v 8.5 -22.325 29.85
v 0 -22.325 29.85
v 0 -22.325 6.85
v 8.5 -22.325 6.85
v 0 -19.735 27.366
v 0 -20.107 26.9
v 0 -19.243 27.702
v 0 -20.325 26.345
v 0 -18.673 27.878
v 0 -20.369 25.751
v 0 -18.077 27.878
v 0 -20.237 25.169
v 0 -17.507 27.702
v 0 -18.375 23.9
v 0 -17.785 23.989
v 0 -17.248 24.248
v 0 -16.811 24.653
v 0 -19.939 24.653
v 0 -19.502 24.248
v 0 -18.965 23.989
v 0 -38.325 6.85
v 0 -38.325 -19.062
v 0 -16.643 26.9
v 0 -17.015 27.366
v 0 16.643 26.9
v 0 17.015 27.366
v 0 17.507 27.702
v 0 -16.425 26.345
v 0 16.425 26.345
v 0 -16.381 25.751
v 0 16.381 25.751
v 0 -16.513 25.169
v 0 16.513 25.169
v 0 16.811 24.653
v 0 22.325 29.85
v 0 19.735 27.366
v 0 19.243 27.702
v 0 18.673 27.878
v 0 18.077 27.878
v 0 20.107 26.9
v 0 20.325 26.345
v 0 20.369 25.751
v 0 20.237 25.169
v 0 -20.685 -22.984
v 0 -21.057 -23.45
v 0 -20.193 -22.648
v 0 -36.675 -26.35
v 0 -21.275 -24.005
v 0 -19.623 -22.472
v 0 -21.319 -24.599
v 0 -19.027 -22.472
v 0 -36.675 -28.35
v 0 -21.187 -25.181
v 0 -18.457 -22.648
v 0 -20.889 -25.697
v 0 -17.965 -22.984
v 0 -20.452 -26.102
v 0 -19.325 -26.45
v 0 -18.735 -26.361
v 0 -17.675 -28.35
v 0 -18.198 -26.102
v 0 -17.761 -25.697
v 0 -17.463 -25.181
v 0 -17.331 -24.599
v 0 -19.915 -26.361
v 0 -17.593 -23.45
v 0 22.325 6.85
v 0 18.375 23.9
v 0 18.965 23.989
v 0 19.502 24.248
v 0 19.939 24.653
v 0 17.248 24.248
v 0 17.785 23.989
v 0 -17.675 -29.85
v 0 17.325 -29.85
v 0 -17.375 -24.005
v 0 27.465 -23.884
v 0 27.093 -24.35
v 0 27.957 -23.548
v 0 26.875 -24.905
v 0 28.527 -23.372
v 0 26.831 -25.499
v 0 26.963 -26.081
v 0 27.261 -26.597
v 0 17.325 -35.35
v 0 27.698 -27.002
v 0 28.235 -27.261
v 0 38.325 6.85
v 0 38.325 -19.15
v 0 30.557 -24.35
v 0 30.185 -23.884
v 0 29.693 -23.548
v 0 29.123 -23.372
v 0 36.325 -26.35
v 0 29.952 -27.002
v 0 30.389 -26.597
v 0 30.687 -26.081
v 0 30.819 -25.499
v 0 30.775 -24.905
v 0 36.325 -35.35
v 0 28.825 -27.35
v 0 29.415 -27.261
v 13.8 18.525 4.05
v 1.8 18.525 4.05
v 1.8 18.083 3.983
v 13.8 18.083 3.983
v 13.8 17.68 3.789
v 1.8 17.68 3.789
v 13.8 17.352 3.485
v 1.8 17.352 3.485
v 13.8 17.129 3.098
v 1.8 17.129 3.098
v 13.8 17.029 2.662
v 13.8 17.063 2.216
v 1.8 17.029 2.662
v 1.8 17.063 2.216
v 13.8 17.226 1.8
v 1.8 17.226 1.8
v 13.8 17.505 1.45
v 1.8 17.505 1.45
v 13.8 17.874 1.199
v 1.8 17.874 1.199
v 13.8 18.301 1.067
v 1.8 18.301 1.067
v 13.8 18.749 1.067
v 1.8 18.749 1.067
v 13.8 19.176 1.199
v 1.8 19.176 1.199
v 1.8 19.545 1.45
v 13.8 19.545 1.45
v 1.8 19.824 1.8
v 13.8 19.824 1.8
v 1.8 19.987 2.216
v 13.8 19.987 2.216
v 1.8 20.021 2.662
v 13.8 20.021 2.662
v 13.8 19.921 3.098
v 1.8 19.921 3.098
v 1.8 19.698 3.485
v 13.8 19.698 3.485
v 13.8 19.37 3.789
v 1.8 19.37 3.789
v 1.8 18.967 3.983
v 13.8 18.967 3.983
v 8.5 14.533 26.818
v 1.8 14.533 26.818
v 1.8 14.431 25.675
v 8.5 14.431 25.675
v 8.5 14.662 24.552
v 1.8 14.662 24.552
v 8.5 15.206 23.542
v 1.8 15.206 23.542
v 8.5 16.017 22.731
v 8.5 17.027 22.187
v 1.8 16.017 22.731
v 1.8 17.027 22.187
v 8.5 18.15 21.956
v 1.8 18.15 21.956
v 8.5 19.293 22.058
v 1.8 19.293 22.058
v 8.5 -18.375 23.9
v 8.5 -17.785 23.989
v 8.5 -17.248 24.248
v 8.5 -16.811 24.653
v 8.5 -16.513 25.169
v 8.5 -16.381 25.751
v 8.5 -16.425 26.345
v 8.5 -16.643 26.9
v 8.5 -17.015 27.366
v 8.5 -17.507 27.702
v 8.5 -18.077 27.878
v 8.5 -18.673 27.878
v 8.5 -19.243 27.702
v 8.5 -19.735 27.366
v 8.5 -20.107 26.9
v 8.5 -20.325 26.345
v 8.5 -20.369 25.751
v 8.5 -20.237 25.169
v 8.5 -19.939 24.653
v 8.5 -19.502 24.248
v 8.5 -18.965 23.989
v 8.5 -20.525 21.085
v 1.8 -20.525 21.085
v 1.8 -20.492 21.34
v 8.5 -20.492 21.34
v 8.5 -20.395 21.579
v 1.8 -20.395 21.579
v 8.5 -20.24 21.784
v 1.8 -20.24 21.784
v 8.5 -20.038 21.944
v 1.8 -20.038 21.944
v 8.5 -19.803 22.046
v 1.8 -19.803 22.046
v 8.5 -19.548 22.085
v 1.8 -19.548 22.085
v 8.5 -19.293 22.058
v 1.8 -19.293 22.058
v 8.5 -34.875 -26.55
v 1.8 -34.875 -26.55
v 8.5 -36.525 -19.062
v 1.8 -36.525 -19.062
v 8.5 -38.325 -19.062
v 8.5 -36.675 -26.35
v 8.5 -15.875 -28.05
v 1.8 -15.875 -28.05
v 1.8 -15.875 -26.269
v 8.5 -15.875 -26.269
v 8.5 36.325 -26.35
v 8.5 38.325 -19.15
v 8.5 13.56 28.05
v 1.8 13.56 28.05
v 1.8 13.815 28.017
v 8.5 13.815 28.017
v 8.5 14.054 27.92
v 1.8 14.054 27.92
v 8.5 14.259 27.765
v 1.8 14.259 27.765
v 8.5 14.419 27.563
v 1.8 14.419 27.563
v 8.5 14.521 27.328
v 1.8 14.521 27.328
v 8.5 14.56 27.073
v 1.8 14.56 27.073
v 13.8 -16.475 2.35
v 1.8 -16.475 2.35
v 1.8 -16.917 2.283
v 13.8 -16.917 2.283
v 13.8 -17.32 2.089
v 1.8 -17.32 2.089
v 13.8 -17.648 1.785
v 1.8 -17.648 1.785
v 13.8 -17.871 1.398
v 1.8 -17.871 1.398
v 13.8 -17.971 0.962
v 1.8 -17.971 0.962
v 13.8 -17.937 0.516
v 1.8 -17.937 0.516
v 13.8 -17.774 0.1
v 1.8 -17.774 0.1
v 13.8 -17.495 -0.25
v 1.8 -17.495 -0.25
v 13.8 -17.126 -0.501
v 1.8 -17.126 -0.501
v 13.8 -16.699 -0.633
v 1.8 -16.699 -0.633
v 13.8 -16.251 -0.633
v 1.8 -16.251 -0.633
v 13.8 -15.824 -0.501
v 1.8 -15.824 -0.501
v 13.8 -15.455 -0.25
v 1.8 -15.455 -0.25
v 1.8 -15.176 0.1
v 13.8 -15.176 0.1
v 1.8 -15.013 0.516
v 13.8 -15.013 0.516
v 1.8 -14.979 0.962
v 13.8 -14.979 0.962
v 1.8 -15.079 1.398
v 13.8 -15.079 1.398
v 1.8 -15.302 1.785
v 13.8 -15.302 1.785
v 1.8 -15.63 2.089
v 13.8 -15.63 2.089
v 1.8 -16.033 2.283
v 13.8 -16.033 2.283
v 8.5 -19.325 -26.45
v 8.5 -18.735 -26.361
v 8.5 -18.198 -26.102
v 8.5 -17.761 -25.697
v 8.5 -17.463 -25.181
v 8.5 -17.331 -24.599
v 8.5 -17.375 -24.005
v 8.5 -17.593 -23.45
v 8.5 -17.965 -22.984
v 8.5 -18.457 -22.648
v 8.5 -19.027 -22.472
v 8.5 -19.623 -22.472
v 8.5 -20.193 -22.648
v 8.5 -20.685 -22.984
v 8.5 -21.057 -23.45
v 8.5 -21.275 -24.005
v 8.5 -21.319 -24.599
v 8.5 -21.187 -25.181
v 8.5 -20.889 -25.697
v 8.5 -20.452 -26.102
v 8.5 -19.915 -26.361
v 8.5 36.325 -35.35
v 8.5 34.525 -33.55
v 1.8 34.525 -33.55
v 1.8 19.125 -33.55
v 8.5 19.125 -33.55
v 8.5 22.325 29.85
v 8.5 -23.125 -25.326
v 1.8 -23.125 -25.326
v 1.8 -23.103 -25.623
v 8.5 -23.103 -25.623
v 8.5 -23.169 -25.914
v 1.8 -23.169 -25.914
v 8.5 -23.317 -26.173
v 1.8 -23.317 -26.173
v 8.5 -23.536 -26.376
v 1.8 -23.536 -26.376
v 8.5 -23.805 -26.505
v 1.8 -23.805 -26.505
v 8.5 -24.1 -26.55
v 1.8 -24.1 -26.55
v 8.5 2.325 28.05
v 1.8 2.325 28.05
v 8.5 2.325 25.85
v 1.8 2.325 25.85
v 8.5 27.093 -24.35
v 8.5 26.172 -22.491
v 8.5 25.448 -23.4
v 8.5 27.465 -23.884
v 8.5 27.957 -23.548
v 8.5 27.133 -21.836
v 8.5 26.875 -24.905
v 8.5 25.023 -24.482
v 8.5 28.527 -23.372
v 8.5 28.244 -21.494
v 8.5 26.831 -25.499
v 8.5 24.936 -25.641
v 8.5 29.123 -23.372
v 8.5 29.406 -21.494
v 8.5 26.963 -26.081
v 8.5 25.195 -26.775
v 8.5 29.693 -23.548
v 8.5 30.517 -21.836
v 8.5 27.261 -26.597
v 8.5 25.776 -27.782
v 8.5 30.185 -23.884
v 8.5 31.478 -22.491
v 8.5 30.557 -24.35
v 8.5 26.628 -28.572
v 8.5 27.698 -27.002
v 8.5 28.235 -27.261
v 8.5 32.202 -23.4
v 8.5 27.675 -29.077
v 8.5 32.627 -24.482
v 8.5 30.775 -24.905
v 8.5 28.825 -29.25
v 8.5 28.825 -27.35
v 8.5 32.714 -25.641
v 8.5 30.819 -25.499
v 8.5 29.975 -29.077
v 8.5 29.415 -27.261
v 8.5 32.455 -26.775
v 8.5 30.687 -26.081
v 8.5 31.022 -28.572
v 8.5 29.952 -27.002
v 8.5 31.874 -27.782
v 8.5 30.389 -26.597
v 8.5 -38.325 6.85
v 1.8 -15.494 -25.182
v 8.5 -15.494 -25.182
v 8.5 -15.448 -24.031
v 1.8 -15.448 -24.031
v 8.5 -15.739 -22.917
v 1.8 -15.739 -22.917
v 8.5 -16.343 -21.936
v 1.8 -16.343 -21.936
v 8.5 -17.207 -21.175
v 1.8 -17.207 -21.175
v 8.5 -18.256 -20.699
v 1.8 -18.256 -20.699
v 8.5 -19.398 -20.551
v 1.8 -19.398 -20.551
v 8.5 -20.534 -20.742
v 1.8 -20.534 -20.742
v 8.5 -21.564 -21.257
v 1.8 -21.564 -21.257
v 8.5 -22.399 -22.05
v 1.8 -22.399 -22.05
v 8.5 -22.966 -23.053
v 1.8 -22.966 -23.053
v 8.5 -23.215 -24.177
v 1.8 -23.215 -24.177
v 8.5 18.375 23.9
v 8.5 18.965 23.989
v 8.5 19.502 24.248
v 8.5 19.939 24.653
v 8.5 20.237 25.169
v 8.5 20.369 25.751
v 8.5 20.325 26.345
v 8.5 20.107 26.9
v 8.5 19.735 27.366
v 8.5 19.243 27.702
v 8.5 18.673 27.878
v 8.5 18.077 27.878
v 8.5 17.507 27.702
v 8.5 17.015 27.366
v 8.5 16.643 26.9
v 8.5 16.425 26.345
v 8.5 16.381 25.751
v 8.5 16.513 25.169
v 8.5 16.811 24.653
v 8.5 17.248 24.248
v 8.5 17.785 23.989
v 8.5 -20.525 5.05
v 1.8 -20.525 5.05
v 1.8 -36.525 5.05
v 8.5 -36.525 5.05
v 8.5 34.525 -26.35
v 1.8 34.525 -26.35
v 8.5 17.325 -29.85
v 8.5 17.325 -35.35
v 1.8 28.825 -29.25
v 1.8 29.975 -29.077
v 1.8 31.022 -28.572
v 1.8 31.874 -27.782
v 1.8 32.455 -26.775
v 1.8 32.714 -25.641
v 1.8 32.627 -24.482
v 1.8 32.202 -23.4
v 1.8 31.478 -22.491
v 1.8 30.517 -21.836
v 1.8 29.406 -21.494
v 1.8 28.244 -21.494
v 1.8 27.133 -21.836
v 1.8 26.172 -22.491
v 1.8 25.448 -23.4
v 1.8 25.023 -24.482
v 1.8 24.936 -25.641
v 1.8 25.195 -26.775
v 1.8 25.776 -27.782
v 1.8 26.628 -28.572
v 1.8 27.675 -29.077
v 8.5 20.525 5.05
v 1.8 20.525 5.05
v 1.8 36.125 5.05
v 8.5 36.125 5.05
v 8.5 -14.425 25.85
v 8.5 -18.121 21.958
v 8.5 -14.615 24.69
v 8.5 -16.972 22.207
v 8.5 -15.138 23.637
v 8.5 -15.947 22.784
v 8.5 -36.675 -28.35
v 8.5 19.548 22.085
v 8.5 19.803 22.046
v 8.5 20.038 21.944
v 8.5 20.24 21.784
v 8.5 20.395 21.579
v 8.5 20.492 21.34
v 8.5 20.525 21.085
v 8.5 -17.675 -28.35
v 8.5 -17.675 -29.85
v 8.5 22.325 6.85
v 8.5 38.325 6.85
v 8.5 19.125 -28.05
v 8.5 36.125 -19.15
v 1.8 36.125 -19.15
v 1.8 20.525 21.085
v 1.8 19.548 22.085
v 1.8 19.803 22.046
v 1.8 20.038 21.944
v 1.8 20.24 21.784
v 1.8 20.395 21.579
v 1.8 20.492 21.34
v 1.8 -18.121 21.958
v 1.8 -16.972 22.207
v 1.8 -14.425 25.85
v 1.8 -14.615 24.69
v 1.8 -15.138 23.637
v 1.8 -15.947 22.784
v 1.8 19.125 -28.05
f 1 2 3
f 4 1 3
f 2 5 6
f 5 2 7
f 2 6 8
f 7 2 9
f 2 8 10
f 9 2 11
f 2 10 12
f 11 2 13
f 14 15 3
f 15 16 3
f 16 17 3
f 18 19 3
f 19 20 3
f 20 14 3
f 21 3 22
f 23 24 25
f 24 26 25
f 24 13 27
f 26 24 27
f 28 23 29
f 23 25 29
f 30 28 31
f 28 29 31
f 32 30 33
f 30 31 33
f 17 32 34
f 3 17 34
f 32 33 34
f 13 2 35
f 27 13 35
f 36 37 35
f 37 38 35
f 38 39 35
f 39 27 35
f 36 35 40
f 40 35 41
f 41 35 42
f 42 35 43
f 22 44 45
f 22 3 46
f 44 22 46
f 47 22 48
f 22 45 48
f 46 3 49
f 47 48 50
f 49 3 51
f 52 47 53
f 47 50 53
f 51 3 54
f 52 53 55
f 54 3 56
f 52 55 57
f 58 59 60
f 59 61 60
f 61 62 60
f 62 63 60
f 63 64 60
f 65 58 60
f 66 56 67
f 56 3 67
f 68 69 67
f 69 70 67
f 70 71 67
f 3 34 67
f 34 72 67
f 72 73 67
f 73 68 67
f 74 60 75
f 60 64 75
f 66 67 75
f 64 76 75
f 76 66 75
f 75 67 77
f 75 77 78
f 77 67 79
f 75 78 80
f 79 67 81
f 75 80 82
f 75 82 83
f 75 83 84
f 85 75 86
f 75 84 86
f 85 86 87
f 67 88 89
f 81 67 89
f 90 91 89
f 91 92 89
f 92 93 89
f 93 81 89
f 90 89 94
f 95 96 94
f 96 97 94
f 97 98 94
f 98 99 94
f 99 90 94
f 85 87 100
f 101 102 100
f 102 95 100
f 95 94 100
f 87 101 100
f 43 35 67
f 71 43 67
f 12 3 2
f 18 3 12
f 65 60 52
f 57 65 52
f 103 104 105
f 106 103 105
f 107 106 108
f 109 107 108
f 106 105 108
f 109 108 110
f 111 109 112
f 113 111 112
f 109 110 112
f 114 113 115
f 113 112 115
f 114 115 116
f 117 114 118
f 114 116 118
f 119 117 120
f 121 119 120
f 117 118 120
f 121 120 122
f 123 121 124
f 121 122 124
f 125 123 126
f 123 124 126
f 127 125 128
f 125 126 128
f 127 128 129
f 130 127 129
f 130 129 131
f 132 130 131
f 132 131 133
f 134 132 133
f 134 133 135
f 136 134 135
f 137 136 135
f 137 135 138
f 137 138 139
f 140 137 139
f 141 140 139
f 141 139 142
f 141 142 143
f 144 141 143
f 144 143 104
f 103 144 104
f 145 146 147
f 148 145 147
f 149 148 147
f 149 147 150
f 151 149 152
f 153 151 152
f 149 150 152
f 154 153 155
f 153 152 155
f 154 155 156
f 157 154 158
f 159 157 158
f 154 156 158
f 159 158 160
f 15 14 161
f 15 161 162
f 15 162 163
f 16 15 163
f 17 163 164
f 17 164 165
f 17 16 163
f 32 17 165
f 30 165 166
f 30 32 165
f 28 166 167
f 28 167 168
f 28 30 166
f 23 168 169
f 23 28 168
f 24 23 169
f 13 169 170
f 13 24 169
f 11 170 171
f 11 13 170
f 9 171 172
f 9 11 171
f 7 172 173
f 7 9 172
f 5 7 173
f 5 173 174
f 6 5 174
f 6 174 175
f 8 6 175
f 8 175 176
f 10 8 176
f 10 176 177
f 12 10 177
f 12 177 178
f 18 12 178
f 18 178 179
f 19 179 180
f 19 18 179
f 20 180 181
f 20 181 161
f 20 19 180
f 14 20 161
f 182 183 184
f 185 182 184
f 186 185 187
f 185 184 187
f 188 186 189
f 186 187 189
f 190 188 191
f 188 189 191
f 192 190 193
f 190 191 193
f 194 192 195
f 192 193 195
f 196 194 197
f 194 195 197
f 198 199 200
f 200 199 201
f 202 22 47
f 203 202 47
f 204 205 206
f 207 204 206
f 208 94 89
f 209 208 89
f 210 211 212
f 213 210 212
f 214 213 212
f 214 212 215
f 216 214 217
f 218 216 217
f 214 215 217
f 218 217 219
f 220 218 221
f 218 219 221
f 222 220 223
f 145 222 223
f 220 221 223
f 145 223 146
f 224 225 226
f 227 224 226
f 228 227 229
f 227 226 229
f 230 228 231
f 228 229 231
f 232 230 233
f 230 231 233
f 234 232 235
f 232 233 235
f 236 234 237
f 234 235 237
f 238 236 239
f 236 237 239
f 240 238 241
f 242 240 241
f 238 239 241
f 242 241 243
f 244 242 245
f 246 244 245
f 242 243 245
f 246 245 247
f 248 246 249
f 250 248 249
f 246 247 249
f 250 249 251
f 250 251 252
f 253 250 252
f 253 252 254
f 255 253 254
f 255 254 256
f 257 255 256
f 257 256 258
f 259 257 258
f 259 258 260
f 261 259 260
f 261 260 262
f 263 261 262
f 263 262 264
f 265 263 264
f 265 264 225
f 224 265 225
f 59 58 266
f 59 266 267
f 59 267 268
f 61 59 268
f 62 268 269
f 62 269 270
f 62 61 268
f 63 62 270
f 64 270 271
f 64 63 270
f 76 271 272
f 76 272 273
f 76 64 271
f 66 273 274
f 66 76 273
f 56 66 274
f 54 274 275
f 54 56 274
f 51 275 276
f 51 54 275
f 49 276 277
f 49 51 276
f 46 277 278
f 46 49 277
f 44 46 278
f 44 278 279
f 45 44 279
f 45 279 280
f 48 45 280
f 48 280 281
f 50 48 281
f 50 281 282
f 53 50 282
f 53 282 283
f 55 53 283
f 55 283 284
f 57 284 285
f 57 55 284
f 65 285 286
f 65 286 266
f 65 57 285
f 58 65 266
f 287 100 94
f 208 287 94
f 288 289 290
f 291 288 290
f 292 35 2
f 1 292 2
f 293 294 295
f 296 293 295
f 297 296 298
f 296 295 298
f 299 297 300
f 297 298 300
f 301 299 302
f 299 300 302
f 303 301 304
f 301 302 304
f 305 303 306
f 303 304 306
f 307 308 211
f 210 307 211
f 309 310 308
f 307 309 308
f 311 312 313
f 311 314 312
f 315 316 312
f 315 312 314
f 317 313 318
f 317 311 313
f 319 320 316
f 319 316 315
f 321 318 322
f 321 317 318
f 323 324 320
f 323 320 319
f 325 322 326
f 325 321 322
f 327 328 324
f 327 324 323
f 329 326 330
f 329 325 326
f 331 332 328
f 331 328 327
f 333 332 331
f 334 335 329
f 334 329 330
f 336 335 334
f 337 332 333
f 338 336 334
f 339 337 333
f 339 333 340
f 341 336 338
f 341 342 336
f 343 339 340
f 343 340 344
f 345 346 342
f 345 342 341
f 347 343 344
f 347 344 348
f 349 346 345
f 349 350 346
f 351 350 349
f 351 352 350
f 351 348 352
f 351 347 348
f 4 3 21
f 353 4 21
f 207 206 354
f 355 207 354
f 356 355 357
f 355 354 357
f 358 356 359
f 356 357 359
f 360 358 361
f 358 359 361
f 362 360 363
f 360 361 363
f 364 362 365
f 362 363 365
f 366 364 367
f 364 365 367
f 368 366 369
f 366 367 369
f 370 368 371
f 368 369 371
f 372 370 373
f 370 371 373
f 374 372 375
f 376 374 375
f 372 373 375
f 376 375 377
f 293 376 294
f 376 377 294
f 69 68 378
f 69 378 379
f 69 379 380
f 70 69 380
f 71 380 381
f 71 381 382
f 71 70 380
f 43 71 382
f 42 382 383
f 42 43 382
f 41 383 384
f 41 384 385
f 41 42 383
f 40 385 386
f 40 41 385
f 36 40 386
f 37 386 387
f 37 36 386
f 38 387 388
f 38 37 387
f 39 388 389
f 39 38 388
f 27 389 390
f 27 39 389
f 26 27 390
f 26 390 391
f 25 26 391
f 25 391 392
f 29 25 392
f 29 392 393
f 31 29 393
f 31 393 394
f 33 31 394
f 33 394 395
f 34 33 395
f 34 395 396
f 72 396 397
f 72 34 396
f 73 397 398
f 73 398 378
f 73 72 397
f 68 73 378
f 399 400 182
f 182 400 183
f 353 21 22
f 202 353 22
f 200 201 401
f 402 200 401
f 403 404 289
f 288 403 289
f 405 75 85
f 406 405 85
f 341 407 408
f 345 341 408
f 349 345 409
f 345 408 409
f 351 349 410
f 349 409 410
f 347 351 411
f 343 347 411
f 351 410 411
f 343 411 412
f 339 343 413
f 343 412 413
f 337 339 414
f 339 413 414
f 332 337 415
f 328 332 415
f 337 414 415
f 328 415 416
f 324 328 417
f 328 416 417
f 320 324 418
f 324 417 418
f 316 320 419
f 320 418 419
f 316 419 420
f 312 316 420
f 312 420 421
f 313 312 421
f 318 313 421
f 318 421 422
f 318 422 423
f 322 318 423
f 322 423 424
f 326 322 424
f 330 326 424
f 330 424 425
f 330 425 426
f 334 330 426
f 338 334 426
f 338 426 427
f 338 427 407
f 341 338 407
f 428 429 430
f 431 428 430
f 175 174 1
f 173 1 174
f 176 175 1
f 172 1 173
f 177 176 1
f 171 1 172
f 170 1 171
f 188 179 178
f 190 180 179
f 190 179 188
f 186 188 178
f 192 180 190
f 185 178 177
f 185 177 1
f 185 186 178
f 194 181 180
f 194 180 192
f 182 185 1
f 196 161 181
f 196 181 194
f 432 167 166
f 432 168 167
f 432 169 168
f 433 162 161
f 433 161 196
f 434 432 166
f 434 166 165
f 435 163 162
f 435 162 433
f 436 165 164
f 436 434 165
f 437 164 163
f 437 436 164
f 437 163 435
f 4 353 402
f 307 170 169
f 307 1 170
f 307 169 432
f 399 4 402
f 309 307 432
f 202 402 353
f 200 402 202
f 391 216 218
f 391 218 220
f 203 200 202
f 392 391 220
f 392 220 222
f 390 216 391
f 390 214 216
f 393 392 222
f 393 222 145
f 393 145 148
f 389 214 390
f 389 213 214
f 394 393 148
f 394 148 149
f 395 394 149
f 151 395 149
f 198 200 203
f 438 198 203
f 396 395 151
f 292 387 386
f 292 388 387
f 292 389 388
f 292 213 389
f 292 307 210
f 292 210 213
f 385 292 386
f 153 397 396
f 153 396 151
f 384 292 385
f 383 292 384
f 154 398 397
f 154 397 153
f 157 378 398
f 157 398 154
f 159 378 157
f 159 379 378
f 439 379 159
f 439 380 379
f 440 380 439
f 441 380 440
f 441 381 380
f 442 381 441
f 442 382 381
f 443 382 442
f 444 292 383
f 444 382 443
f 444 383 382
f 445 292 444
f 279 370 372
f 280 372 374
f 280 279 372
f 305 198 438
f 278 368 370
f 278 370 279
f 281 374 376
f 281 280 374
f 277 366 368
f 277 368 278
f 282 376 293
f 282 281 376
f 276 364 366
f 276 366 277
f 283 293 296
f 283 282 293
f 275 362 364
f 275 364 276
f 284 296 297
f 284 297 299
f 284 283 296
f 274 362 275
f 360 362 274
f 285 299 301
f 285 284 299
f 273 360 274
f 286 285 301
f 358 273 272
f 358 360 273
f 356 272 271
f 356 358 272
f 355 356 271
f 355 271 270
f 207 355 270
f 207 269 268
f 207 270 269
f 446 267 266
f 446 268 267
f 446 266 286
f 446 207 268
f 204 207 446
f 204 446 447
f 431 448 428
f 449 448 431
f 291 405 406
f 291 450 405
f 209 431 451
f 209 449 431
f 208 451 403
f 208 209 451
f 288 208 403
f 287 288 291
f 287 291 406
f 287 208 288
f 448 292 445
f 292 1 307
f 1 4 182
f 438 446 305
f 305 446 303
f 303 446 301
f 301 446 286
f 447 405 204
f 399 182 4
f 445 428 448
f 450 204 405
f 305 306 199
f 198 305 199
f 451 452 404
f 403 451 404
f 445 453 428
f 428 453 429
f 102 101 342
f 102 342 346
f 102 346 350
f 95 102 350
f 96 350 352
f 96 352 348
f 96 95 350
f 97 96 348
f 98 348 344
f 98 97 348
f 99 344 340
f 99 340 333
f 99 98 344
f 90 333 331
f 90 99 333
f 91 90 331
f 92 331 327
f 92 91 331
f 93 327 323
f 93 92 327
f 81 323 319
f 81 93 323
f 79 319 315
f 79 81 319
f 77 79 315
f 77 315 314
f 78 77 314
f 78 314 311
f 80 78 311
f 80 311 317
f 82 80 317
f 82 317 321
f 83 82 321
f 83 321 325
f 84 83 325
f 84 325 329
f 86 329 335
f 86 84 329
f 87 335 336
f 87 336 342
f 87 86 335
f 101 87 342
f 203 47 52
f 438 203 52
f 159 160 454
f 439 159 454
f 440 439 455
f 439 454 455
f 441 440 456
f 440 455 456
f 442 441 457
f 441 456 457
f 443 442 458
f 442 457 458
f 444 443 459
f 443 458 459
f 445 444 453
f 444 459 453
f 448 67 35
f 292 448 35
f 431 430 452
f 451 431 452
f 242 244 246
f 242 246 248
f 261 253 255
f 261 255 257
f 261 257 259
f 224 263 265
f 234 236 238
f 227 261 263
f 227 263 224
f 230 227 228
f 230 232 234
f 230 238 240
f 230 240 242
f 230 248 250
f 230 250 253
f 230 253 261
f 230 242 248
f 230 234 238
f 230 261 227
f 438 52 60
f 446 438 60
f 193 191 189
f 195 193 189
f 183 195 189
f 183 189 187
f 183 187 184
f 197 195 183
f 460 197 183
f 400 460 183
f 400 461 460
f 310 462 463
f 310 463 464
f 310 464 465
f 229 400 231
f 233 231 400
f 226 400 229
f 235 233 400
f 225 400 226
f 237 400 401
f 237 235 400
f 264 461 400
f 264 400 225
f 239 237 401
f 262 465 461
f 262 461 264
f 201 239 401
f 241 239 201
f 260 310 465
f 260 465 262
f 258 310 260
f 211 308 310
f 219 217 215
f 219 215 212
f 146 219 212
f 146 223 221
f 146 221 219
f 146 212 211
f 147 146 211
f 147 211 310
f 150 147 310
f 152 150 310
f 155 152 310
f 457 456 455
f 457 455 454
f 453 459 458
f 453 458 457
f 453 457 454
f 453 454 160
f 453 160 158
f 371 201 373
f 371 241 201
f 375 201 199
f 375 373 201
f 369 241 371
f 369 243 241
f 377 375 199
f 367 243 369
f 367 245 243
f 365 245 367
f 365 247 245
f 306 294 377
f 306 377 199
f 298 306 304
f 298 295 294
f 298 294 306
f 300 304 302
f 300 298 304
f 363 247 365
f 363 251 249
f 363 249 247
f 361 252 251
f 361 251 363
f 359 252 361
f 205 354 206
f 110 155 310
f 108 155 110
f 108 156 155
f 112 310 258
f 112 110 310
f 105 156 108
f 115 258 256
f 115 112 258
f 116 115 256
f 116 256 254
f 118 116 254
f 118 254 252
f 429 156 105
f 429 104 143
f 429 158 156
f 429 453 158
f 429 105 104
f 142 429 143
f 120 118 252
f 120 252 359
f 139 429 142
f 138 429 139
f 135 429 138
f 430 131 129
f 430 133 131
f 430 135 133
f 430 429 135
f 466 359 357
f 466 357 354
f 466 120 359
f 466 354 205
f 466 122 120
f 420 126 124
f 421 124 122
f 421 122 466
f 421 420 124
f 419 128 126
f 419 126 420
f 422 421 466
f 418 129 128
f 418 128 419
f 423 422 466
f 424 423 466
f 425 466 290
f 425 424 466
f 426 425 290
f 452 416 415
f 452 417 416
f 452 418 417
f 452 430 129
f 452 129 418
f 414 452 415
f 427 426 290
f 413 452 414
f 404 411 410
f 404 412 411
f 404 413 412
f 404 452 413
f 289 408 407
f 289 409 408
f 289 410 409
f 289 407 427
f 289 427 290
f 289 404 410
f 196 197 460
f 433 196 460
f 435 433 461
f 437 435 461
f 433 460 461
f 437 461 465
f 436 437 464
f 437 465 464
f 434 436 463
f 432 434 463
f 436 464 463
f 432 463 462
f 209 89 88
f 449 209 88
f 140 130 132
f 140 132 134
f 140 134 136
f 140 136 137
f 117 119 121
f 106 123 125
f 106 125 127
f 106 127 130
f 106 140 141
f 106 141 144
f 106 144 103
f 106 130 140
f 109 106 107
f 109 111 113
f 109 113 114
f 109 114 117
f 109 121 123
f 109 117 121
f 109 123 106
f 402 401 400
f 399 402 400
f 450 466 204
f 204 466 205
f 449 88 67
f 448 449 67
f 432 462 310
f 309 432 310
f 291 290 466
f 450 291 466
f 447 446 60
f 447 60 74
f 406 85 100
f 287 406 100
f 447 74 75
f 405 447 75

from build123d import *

# Parameters (mm, degrees)
SKETCH_1_R        = 2
EXTRUDE_2_DEPTH   = 8.5
SKETCH_1_R_2      = 3.9
EXTRUDE_2_2_DEPTH = 8.5
SKETCH_1_6_R      = 1.5
SKETCH_1_6_R_2    = 3.9
EXTRUDE_3_DEPTH   = 1.8
SKETCH_1_7_R      = 1.5
EXTRUDE_4_DEPTH   = 13.8


with BuildPart() as part:
    # Эскиз1 → Бобышка-Вытянуть2 (new body)
    with BuildSketch(Plane(origin=(0, 0, 0), x_dir=(0, 0, -1), z_dir=(1, 0, 0))):
        Polygon((-6.85, 38.325), (-6.85, 22.325), (-29.85, 22.325), (-29.85, -22.325), (-6.85, -22.325), (-6.85, -38.325), (19.061824645, -38.325), (26.35, -36.675), (28.35, -36.675), (28.35, -17.675), (29.85, -17.675), (29.85, 17.325), (35.35, 17.325), (35.35, 36.325), (26.35, 36.325), (19.15, 38.325), align=None)
        with Locations((-25.9, -18.375)):
            Circle(SKETCH_1_R, mode=Mode.SUBTRACT)
        with BuildLine():
            Line((-5.05, -36.525), (-5.05, -20.525))
            Line((-5.05, -20.525), (-21.085438753, -20.525))
            ThreePointArc((-21.085438753, -20.525), (-21.87039838, -20.144546918), (-22.058077389, -19.292676768))
            ThreePointArc((-22.058077389, -19.292676768), (-22.783982594, -15.947463074), (-25.85, -14.425316468))
            Line((-25.85, -14.425316468), (-25.85, 2.325))
            Line((-25.85, 2.325), (-28.05, 2.325))
            Line((-28.05, 2.325), (-28.05, 13.560438753))
            ThreePointArc((-28.05, 13.560438753), (-27.669546918, 14.34539838), (-26.817676768, 14.533077389))
            ThreePointArc((-26.817676768, 14.533077389), (-23.106928214, 15.581928214), (-22.058077389, 19.292676768))
            ThreePointArc((-22.058077389, 19.292676768), (-21.87039838, 20.144546918), (-21.085438753, 20.525))
            Line((-21.085438753, 20.525), (-5.05, 20.525))
            Line((-5.05, 20.525), (-5.05, 36.125))
            Line((-5.05, 36.125), (19.15, 36.125))
            Line((19.15, 36.125), (26.35, 34.525))
            Line((26.35, 34.525), (33.55, 34.525))
            Line((33.55, 34.525), (33.55, 19.125))
            Line((33.55, 19.125), (28.05, 19.125))
            Line((28.05, 19.125), (28.05, -15.875))
            Line((28.05, -15.875), (26.268653348, -15.875))
            ThreePointArc((26.268653348, -15.875), (20.582582899, -18.821924489), (25.325510204, -23.125458115))
            ThreePointArc((25.325510204, -23.125458115), (26.172699849, -23.317473758), (26.55, -24.099934555))
            Line((26.55, -24.099934555), (26.55, -34.875))
            Line((26.55, -34.875), (19.061824645, -36.525))
            Line((19.061824645, -36.525), (-5.05, -36.525))
        make_face(mode=Mode.SUBTRACT)
        with Locations((24.45, -19.325)):
            Circle(SKETCH_1_R, mode=Mode.SUBTRACT)
        with Locations((-25.9, 18.375)):
            Circle(SKETCH_1_R, mode=Mode.SUBTRACT)
    extrude(amount=EXTRUDE_2_DEPTH)



with BuildPart() as body_2:
    # Эскиз1 → Extrude 2 2 (new body)
    with BuildSketch(Plane(origin=(0, 0, 0), x_dir=(0, 0, -1), z_dir=(1, 0, 0))):
        with Locations((25.35, 28.825)):
            Circle(SKETCH_1_R_2)
        with Locations((25.35, 28.825)):
            Circle(SKETCH_1_R, mode=Mode.SUBTRACT)
    extrude(amount=EXTRUDE_2_2_DEPTH)


with BuildPart() as part_1:
    add(part.part)

    add(body_2.part)  # Бобышка-Вытянуть3 merges body 2
    # Эскиз1<6> → Бобышка-Вытянуть3 (add)
    with BuildSketch(Plane(origin=(0, 0, 0), x_dir=(0, 0, -1), z_dir=(1, 0, 0))):
        with BuildLine():
            Line((-21.085438753, -20.525), (-5.05, -20.525))
            Line((-5.05, -20.525), (-5.05, -36.525))
            Line((-5.05, -36.525), (19.061824645, -36.525))
            Line((19.061824645, -36.525), (26.55, -34.875))
            Line((26.55, -34.875), (26.55, -24.099934555))
            ThreePointArc((26.55, -24.099934555), (26.172699849, -23.317473758), (25.325510204, -23.125458115))
            ThreePointArc((25.325510204, -23.125458115), (20.582582899, -18.821924489), (26.268653348, -15.875))
            Line((26.268653348, -15.875), (26.55, -15.875))
            Line((26.55, -15.875), (28.05, -15.875))
            Line((28.05, -15.875), (28.05, 19.125))
            Line((28.05, 19.125), (33.55, 19.125))
            Line((33.55, 19.125), (33.55, 34.525))
            Line((33.55, 34.525), (26.35, 34.525))
            Line((26.35, 34.525), (19.15, 36.125))
            Line((19.15, 36.125), (-5.05, 36.125))
            Line((-5.05, 36.125), (-5.05, 20.525))
            Line((-5.05, 20.525), (-21.085438753, 20.525))
            ThreePointArc((-21.085438753, 20.525), (-21.87039838, 20.144546918), (-22.058077389, 19.292676768))
            ThreePointArc((-22.058077389, 19.292676768), (-23.106928214, 15.581928214), (-26.817676768, 14.533077389))
            ThreePointArc((-26.817676768, 14.533077389), (-27.669546918, 14.34539838), (-28.05, 13.560438753))
            Line((-28.05, 13.560438753), (-28.05, 2.325))
            Line((-28.05, 2.325), (-25.85, 2.325))
            Line((-25.85, 2.325), (-25.85, -14.425316468))
            ThreePointArc((-25.85, -14.425316468), (-22.783982594, -15.947463074), (-22.058077389, -19.292676768))
            ThreePointArc((-22.058077389, -19.292676768), (-21.87039838, -20.144546918), (-21.085438753, -20.525))
        make_face()
        with Locations((-0.85, -16.475)):
            Circle(SKETCH_1_6_R, mode=Mode.SUBTRACT)
        with Locations((-2.55, 18.525)):
            Circle(SKETCH_1_6_R, mode=Mode.SUBTRACT)
        with Locations((25.35, 28.825)):
            Circle(SKETCH_1_6_R_2, mode=Mode.SUBTRACT)
    extrude(amount=EXTRUDE_3_DEPTH)

    # Эскиз1<7> → Бобышка-Вытянуть4 (add)
    with BuildSketch(Plane(origin=(0, 0, 0), x_dir=(0, 0, -1), z_dir=(1, 0, 0))):
        with Locations((-0.85, -16.475)):
            Circle(SKETCH_1_7_R)
        with Locations((-2.55, 18.525)):
            Circle(SKETCH_1_7_R)
    extrude(amount=EXTRUDE_4_DEPTH)


solid = part_1.part
